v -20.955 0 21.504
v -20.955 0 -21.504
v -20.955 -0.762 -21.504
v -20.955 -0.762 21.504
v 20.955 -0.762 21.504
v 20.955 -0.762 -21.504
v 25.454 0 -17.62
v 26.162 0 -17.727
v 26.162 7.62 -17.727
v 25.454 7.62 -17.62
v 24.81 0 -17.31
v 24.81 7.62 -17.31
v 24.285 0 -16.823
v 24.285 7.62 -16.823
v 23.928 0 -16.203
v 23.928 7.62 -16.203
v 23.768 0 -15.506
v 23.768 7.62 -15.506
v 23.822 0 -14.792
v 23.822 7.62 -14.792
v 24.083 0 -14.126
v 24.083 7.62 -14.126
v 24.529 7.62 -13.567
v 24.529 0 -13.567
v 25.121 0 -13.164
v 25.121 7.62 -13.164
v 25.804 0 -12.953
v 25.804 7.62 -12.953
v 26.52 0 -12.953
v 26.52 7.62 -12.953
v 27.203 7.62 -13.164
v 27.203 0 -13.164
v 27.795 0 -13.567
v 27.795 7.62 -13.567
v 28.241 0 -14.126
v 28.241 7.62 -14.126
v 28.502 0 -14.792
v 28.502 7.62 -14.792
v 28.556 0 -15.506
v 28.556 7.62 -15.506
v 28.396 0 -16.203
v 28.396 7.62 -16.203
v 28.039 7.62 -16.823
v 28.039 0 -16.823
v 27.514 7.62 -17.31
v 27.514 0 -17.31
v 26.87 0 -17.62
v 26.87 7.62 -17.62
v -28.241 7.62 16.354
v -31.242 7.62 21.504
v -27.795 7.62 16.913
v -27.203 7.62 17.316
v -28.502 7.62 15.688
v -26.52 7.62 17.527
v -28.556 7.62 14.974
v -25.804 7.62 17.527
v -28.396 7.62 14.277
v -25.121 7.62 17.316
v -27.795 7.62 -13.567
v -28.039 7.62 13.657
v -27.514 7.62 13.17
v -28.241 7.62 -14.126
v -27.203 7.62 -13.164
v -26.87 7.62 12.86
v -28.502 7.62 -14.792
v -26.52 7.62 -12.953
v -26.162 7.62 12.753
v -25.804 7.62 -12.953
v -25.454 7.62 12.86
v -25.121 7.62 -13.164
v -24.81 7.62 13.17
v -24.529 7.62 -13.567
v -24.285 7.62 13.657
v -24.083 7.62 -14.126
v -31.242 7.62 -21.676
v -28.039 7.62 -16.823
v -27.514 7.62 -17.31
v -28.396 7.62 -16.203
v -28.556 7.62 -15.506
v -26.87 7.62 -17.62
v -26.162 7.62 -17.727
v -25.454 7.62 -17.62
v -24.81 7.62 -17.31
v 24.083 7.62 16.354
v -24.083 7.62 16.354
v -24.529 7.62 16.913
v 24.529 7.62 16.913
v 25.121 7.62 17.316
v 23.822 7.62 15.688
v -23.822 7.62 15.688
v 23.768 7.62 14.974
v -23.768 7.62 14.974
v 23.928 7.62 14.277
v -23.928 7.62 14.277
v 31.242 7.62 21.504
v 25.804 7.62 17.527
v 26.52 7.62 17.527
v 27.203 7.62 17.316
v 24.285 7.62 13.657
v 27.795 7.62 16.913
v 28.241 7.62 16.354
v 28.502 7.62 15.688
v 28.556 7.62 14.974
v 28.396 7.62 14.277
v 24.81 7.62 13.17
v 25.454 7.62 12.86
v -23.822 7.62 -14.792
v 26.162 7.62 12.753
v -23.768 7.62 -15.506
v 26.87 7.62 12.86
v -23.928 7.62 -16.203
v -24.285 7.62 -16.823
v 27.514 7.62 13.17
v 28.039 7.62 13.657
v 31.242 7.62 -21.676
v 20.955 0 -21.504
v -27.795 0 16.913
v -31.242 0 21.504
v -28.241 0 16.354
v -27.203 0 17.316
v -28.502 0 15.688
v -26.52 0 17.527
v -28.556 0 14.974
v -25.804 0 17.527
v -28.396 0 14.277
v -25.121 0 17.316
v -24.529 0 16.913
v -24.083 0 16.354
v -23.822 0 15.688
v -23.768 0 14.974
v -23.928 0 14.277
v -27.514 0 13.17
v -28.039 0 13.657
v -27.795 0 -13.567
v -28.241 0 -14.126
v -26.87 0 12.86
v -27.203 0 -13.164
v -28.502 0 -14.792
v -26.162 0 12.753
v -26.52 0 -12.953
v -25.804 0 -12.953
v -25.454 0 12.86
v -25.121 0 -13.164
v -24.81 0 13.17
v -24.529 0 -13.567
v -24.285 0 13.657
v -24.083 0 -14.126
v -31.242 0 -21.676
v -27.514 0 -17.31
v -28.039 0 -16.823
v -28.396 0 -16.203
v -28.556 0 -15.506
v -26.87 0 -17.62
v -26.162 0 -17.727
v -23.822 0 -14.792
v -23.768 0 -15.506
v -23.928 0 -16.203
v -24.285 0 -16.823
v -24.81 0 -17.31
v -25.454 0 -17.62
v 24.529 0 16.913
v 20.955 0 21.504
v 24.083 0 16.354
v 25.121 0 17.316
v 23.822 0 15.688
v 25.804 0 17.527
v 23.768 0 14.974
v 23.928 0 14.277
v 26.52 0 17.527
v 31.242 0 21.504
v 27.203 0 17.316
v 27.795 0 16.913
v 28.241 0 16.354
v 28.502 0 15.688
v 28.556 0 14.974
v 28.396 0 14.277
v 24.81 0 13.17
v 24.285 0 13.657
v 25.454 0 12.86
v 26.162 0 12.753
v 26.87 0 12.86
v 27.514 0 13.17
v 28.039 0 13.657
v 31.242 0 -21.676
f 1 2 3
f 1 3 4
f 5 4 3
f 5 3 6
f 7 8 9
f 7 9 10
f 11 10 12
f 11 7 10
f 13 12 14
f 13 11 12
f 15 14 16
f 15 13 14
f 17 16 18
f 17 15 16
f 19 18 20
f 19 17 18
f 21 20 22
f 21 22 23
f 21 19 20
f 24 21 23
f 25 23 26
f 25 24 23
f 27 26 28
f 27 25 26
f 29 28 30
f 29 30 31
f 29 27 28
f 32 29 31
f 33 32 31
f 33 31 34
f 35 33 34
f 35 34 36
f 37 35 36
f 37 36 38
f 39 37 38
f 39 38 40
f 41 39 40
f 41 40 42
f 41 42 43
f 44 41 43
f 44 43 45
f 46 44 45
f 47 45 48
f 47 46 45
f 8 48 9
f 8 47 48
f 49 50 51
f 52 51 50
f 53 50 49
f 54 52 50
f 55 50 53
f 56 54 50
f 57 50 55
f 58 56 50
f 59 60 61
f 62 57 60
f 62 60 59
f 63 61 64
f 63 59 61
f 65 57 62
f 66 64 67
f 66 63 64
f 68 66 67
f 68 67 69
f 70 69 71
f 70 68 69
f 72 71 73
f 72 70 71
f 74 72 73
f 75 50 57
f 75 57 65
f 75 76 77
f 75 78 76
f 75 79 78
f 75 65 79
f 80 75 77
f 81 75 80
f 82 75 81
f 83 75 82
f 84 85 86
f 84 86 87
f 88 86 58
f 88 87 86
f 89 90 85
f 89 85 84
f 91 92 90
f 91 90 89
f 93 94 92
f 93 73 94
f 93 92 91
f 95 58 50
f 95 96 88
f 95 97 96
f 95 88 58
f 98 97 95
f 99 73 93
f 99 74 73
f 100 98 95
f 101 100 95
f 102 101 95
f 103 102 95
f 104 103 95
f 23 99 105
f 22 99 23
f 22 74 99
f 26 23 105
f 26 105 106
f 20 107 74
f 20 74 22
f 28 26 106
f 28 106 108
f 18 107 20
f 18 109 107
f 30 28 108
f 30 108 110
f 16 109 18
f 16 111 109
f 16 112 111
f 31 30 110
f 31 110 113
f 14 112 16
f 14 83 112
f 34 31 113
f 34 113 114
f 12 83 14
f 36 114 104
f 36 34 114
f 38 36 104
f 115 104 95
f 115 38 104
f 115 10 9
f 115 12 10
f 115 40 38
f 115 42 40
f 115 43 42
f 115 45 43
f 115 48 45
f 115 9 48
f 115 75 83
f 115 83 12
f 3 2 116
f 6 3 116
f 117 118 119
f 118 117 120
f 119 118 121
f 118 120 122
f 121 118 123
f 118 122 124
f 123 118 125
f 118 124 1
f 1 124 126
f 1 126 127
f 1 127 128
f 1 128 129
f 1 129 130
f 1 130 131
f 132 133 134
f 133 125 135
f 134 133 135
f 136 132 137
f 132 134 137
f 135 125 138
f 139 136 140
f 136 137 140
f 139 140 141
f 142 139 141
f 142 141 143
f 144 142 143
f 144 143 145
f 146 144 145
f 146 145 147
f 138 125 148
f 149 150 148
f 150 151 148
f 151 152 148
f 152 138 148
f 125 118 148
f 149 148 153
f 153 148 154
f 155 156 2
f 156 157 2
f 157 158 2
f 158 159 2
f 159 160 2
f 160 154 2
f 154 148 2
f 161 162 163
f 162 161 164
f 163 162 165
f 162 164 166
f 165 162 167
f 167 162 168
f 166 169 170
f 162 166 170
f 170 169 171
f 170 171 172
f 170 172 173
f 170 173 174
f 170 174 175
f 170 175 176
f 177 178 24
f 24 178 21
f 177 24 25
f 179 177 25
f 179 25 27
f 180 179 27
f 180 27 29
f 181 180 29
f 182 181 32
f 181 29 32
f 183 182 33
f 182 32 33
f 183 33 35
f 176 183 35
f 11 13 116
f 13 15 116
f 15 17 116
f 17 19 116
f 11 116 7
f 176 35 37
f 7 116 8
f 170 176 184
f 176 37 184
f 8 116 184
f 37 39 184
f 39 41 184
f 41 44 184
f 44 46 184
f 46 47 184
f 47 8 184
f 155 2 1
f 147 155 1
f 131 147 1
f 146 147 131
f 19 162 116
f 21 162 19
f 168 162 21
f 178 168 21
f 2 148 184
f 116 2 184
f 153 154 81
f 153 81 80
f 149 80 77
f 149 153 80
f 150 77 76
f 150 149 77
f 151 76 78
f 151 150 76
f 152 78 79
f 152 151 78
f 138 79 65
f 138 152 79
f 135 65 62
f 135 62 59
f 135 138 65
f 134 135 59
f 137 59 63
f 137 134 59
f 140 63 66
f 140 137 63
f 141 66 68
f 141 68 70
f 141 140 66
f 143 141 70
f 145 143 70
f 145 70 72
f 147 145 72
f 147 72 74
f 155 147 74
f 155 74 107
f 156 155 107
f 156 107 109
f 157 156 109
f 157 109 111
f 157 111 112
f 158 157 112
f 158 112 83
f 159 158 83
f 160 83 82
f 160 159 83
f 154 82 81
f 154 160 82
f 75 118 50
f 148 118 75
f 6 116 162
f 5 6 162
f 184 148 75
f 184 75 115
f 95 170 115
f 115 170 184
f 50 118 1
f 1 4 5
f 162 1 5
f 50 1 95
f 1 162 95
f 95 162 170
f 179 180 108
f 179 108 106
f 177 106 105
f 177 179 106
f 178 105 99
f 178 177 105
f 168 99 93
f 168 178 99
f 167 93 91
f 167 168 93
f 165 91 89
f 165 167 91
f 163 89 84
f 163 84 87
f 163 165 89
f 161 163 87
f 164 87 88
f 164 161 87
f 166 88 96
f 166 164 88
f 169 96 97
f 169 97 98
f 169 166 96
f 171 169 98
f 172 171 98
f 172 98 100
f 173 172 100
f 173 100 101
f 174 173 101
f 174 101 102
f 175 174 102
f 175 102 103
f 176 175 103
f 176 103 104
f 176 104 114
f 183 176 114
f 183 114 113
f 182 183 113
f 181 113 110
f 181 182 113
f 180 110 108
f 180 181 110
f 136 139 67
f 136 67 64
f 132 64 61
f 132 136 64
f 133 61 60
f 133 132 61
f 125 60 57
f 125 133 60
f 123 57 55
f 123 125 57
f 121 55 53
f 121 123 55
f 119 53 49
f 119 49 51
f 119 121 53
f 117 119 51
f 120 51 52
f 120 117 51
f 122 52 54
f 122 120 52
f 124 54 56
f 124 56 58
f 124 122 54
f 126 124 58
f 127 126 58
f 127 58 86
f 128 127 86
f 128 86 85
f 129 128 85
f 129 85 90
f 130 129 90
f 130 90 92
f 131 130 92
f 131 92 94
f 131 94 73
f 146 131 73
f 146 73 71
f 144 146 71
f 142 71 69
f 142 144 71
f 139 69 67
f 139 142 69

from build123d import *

# Parameters (mm, degrees)
SKETCH1_W           = 62.484
SKETCH1_H           = 43.18
SKETCH1_R           = 2.4003
BOSS_EXTRUDE1_DEPTH = 7.62
SKETCH2_W           = 41.91
SKETCH2_H           = 43.007401248
BOSS_EXTRUDE2_DEPTH = 0.762


with BuildPart() as part:
    # Sketch1 → Boss-Extrude1 (new body)
    with BuildSketch(Plane(origin=(0, 0, 0), x_dir=(1, 0, 0), z_dir=(0, 1, 0))):
        with Locations((0, 0.086299376)):
            Rectangle(SKETCH1_W, SKETCH1_H)
        with Locations(Location((-26.162, 15.326299376, 0), (0, 0, 90))):
            Circle(SKETCH1_R, mode=Mode.SUBTRACT)
        with Locations(Location((-26.162, -15.153700624, 0), (0, 0, 90))):
            Circle(SKETCH1_R, mode=Mode.SUBTRACT)
        with Locations(Location((26.162, -15.153700624, 0), (0, 0, 90))):
            Circle(SKETCH1_R, mode=Mode.SUBTRACT)
        with Locations(Location((26.162, 15.326299376, 0), (0, 0, 90))):
            Circle(SKETCH1_R, mode=Mode.SUBTRACT)
    extrude(amount=BOSS_EXTRUDE1_DEPTH)

    # Sketch2 → Boss-Extrude2 (add)
    with BuildSketch(Plane.XZ):
        Rectangle(SKETCH2_W, SKETCH2_H)
    extrude(amount=BOSS_EXTRUDE2_DEPTH)


solid = part.part
